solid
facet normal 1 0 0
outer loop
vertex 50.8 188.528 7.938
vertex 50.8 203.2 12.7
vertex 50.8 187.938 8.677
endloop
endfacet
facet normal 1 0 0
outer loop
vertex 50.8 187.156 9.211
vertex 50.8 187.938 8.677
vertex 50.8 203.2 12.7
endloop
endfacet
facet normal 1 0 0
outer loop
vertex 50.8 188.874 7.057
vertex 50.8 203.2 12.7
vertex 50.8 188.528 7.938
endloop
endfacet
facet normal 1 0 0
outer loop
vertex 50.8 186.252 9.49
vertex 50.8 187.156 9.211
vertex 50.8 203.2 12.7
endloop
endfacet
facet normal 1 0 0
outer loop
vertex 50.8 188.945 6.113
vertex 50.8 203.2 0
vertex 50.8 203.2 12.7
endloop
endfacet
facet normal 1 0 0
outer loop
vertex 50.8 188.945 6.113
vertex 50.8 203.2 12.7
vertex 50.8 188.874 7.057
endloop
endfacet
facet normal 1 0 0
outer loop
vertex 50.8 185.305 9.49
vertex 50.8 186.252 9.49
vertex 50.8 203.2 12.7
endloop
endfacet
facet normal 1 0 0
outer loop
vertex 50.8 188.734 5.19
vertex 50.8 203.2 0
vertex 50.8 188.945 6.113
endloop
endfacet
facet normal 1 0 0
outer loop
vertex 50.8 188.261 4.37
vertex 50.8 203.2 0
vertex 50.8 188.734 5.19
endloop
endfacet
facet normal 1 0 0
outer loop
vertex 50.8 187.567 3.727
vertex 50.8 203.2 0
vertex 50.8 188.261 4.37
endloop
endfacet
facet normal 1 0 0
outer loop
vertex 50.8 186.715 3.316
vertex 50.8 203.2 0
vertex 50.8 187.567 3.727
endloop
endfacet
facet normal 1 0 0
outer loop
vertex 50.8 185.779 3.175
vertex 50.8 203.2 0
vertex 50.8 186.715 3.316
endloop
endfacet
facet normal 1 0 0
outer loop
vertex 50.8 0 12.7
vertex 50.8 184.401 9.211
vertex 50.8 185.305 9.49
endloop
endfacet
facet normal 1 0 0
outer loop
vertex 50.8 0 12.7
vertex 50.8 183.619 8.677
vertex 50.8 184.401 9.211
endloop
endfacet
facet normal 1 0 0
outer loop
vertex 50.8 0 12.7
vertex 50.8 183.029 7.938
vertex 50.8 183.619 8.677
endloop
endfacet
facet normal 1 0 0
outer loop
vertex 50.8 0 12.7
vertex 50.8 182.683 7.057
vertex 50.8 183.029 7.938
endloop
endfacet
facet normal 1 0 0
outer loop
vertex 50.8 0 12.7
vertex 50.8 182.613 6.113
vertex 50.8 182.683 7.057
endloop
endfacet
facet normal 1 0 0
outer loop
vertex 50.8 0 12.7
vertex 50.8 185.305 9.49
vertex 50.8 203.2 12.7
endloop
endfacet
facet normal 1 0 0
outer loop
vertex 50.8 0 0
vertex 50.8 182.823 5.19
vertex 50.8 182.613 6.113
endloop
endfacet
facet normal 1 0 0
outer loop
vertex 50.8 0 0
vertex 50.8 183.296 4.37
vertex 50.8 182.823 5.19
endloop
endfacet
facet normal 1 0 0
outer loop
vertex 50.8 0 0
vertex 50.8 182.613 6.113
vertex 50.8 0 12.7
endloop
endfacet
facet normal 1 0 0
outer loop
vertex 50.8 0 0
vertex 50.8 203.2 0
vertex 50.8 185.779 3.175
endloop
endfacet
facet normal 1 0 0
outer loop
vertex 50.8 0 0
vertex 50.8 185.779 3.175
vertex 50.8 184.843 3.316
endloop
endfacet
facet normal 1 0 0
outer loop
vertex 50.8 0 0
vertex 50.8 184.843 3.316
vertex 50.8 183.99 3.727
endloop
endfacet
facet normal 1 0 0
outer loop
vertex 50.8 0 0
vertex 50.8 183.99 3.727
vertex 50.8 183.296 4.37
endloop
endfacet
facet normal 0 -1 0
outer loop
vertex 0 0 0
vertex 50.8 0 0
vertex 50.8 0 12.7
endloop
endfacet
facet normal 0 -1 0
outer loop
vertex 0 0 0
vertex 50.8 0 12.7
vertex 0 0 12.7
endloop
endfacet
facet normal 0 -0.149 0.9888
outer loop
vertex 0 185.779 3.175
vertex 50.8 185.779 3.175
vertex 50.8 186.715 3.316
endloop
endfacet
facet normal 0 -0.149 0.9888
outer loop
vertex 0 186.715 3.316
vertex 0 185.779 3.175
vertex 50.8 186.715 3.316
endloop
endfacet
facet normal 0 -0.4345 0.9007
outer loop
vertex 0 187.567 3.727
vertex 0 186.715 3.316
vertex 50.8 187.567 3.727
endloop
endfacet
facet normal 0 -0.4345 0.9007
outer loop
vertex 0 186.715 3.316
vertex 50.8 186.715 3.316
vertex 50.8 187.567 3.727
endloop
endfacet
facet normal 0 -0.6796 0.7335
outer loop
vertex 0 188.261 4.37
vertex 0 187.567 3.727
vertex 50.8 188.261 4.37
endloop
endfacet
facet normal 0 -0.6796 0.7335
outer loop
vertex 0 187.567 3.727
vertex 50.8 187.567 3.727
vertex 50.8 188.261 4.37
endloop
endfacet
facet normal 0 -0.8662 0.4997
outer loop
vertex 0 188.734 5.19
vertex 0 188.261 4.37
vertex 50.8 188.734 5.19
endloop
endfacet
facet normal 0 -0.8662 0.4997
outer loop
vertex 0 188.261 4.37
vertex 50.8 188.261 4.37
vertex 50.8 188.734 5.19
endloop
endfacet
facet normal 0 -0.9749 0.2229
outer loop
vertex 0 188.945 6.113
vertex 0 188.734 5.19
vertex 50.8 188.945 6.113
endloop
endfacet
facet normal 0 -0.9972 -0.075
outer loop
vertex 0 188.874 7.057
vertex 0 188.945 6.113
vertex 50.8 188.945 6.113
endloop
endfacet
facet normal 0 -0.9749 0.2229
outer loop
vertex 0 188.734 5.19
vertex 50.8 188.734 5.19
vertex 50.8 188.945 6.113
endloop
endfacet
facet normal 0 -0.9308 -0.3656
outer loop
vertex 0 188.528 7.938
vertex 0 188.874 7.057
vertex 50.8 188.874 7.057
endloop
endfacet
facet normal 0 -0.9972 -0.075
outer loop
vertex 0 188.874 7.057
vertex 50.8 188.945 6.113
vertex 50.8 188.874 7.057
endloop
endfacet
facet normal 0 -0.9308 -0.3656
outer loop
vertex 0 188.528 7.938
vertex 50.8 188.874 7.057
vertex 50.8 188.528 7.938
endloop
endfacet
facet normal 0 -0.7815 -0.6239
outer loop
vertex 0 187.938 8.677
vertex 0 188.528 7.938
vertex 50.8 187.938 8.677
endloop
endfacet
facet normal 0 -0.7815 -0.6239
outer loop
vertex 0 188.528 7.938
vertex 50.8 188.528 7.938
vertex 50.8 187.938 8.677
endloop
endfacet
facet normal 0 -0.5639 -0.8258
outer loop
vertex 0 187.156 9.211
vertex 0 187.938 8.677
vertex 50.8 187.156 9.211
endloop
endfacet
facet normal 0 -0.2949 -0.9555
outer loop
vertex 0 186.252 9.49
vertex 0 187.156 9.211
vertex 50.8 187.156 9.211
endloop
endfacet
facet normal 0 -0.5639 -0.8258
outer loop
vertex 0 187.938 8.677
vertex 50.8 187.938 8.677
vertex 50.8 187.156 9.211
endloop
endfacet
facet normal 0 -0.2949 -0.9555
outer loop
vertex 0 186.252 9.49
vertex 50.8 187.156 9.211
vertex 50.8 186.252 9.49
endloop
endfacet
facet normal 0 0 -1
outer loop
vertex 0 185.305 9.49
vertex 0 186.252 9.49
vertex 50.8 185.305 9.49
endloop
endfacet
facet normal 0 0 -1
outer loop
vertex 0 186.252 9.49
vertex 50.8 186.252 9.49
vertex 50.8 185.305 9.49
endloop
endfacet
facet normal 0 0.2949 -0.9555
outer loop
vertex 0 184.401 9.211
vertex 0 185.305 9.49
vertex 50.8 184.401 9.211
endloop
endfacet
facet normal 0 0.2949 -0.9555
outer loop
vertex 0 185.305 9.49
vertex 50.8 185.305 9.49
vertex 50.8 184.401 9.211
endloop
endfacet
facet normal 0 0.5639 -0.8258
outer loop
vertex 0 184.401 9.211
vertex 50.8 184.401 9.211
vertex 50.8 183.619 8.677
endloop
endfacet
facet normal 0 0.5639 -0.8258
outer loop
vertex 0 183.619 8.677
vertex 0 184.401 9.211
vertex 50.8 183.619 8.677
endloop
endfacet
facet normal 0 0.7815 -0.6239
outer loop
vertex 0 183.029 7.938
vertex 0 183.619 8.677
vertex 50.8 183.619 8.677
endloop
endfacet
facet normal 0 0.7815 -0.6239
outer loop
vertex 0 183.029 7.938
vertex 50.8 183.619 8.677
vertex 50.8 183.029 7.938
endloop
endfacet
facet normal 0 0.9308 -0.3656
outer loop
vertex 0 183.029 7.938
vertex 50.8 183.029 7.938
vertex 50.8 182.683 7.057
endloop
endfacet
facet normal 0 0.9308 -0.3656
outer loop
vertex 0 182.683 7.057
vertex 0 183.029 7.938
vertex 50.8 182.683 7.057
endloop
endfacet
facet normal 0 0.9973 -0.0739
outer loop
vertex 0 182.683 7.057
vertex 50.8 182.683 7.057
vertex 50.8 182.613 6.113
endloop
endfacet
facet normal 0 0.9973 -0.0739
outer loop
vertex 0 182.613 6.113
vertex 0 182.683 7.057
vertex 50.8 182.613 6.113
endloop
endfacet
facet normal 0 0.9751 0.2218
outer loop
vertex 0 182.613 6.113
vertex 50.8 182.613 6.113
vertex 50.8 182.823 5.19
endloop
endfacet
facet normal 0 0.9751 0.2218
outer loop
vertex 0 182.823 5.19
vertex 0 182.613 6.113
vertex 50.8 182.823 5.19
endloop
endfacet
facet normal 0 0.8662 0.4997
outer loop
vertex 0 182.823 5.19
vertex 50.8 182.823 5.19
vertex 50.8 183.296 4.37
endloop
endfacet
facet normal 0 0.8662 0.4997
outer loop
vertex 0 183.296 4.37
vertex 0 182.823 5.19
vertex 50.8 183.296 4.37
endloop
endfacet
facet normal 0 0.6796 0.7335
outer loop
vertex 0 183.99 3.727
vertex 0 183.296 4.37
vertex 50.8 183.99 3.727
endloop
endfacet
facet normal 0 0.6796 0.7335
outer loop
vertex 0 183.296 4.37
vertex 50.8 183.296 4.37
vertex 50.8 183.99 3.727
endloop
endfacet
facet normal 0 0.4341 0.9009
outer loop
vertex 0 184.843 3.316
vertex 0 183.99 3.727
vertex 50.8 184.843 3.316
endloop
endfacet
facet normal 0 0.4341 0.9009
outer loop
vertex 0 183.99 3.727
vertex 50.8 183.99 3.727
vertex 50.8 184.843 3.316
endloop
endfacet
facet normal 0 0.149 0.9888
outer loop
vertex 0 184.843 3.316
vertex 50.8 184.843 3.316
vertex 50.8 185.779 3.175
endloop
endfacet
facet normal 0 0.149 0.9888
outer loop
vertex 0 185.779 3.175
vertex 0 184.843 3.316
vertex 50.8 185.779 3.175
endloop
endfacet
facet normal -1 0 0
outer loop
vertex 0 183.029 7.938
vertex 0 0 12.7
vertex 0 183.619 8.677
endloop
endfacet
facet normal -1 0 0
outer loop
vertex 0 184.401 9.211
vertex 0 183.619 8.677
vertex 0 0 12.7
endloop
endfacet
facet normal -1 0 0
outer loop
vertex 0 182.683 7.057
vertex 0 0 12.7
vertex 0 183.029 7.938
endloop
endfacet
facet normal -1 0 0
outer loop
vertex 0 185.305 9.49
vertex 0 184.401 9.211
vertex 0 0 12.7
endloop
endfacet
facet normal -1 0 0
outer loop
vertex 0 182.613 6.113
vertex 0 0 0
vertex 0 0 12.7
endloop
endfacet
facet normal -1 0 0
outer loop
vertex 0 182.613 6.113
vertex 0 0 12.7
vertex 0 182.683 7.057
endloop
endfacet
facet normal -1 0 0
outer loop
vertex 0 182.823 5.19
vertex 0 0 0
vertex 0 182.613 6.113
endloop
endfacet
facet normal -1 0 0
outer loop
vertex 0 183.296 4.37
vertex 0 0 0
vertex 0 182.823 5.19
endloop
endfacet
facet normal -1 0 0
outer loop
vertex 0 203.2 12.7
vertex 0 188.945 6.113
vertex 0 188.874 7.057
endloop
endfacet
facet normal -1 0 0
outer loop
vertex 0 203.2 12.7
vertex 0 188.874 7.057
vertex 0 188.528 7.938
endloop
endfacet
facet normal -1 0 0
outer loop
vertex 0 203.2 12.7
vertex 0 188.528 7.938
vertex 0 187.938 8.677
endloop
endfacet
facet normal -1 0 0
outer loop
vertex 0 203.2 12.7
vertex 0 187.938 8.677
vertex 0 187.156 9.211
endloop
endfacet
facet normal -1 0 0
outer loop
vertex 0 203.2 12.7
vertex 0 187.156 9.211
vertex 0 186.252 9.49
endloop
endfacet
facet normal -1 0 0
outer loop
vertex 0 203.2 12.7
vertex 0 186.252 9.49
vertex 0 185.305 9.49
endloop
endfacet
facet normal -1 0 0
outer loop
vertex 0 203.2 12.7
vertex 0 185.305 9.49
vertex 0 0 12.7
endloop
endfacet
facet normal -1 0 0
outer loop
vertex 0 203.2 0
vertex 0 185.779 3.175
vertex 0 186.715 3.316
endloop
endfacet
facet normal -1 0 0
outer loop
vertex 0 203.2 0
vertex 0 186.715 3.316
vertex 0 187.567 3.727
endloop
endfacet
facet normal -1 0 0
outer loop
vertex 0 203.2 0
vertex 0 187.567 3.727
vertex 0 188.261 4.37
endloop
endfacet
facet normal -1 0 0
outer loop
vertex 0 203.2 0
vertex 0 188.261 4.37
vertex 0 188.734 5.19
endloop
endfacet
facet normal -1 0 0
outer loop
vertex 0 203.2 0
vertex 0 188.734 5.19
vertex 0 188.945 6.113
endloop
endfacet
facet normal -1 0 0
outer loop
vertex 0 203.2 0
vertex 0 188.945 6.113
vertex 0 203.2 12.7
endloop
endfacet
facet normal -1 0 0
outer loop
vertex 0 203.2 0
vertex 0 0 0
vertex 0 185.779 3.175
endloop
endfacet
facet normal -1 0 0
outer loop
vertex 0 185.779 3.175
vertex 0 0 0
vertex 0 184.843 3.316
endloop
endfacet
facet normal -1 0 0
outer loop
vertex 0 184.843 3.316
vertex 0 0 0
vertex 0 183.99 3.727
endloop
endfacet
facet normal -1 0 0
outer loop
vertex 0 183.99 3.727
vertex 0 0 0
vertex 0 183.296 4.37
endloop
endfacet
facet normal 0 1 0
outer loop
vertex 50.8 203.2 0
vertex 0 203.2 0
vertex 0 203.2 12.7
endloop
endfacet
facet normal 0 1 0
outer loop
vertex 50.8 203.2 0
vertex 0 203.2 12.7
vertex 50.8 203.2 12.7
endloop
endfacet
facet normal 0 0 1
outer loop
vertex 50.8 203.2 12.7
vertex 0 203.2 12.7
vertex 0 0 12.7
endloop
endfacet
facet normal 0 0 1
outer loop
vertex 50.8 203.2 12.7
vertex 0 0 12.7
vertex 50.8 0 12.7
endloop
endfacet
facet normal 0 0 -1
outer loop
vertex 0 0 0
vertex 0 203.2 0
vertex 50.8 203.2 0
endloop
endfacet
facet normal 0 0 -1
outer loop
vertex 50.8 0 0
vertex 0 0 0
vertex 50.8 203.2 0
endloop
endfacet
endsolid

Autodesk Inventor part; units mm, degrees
ref_plane "YZ Plane" through (0, 0, 0) normal (1, 0, 0) x (0, 1, 0)
ref_plane "XZ Plane" through (0, 0, 0) normal (0, 1, 0) x (-1, 0, 0)
ref_plane "XY Plane" through (0, 0, 0) normal (0, 0, 1) x (1, 0, 0)
sketch "Sketch1" plane through (0, 0, 0) normal (0, 0, 1) x (1, 0, 0)
  line L0 (0, 0) -> (0, 203.2)
  line L1 (0, 203.2) -> (50.8, 203.2)
  line L2 (50.8, 203.2) -> (50.8, 0)
  line L3 (50.8, 0) -> (0, 0)
  dimension "d0" = 203.2
  dimension "d1" = 50.8
extrude "Extrusion1" add sketch "Sketch1" along normal blind 12.7
sketch "Sketch2" plane through (50.8, 0, 0) normal (1, 0, 0) x (0, 0, -1)
  circle A0 centre (-6.35, 185.7787) radius 3.175
  line L0 (0, 203.2) -> (0, 0) projected
  dimension "d4" = 6.35
  dimension "d7" = 6.35
extrude "Extrusion2" cut sketch "Sketch2" against normal blind 127
properties part number "Bar"
